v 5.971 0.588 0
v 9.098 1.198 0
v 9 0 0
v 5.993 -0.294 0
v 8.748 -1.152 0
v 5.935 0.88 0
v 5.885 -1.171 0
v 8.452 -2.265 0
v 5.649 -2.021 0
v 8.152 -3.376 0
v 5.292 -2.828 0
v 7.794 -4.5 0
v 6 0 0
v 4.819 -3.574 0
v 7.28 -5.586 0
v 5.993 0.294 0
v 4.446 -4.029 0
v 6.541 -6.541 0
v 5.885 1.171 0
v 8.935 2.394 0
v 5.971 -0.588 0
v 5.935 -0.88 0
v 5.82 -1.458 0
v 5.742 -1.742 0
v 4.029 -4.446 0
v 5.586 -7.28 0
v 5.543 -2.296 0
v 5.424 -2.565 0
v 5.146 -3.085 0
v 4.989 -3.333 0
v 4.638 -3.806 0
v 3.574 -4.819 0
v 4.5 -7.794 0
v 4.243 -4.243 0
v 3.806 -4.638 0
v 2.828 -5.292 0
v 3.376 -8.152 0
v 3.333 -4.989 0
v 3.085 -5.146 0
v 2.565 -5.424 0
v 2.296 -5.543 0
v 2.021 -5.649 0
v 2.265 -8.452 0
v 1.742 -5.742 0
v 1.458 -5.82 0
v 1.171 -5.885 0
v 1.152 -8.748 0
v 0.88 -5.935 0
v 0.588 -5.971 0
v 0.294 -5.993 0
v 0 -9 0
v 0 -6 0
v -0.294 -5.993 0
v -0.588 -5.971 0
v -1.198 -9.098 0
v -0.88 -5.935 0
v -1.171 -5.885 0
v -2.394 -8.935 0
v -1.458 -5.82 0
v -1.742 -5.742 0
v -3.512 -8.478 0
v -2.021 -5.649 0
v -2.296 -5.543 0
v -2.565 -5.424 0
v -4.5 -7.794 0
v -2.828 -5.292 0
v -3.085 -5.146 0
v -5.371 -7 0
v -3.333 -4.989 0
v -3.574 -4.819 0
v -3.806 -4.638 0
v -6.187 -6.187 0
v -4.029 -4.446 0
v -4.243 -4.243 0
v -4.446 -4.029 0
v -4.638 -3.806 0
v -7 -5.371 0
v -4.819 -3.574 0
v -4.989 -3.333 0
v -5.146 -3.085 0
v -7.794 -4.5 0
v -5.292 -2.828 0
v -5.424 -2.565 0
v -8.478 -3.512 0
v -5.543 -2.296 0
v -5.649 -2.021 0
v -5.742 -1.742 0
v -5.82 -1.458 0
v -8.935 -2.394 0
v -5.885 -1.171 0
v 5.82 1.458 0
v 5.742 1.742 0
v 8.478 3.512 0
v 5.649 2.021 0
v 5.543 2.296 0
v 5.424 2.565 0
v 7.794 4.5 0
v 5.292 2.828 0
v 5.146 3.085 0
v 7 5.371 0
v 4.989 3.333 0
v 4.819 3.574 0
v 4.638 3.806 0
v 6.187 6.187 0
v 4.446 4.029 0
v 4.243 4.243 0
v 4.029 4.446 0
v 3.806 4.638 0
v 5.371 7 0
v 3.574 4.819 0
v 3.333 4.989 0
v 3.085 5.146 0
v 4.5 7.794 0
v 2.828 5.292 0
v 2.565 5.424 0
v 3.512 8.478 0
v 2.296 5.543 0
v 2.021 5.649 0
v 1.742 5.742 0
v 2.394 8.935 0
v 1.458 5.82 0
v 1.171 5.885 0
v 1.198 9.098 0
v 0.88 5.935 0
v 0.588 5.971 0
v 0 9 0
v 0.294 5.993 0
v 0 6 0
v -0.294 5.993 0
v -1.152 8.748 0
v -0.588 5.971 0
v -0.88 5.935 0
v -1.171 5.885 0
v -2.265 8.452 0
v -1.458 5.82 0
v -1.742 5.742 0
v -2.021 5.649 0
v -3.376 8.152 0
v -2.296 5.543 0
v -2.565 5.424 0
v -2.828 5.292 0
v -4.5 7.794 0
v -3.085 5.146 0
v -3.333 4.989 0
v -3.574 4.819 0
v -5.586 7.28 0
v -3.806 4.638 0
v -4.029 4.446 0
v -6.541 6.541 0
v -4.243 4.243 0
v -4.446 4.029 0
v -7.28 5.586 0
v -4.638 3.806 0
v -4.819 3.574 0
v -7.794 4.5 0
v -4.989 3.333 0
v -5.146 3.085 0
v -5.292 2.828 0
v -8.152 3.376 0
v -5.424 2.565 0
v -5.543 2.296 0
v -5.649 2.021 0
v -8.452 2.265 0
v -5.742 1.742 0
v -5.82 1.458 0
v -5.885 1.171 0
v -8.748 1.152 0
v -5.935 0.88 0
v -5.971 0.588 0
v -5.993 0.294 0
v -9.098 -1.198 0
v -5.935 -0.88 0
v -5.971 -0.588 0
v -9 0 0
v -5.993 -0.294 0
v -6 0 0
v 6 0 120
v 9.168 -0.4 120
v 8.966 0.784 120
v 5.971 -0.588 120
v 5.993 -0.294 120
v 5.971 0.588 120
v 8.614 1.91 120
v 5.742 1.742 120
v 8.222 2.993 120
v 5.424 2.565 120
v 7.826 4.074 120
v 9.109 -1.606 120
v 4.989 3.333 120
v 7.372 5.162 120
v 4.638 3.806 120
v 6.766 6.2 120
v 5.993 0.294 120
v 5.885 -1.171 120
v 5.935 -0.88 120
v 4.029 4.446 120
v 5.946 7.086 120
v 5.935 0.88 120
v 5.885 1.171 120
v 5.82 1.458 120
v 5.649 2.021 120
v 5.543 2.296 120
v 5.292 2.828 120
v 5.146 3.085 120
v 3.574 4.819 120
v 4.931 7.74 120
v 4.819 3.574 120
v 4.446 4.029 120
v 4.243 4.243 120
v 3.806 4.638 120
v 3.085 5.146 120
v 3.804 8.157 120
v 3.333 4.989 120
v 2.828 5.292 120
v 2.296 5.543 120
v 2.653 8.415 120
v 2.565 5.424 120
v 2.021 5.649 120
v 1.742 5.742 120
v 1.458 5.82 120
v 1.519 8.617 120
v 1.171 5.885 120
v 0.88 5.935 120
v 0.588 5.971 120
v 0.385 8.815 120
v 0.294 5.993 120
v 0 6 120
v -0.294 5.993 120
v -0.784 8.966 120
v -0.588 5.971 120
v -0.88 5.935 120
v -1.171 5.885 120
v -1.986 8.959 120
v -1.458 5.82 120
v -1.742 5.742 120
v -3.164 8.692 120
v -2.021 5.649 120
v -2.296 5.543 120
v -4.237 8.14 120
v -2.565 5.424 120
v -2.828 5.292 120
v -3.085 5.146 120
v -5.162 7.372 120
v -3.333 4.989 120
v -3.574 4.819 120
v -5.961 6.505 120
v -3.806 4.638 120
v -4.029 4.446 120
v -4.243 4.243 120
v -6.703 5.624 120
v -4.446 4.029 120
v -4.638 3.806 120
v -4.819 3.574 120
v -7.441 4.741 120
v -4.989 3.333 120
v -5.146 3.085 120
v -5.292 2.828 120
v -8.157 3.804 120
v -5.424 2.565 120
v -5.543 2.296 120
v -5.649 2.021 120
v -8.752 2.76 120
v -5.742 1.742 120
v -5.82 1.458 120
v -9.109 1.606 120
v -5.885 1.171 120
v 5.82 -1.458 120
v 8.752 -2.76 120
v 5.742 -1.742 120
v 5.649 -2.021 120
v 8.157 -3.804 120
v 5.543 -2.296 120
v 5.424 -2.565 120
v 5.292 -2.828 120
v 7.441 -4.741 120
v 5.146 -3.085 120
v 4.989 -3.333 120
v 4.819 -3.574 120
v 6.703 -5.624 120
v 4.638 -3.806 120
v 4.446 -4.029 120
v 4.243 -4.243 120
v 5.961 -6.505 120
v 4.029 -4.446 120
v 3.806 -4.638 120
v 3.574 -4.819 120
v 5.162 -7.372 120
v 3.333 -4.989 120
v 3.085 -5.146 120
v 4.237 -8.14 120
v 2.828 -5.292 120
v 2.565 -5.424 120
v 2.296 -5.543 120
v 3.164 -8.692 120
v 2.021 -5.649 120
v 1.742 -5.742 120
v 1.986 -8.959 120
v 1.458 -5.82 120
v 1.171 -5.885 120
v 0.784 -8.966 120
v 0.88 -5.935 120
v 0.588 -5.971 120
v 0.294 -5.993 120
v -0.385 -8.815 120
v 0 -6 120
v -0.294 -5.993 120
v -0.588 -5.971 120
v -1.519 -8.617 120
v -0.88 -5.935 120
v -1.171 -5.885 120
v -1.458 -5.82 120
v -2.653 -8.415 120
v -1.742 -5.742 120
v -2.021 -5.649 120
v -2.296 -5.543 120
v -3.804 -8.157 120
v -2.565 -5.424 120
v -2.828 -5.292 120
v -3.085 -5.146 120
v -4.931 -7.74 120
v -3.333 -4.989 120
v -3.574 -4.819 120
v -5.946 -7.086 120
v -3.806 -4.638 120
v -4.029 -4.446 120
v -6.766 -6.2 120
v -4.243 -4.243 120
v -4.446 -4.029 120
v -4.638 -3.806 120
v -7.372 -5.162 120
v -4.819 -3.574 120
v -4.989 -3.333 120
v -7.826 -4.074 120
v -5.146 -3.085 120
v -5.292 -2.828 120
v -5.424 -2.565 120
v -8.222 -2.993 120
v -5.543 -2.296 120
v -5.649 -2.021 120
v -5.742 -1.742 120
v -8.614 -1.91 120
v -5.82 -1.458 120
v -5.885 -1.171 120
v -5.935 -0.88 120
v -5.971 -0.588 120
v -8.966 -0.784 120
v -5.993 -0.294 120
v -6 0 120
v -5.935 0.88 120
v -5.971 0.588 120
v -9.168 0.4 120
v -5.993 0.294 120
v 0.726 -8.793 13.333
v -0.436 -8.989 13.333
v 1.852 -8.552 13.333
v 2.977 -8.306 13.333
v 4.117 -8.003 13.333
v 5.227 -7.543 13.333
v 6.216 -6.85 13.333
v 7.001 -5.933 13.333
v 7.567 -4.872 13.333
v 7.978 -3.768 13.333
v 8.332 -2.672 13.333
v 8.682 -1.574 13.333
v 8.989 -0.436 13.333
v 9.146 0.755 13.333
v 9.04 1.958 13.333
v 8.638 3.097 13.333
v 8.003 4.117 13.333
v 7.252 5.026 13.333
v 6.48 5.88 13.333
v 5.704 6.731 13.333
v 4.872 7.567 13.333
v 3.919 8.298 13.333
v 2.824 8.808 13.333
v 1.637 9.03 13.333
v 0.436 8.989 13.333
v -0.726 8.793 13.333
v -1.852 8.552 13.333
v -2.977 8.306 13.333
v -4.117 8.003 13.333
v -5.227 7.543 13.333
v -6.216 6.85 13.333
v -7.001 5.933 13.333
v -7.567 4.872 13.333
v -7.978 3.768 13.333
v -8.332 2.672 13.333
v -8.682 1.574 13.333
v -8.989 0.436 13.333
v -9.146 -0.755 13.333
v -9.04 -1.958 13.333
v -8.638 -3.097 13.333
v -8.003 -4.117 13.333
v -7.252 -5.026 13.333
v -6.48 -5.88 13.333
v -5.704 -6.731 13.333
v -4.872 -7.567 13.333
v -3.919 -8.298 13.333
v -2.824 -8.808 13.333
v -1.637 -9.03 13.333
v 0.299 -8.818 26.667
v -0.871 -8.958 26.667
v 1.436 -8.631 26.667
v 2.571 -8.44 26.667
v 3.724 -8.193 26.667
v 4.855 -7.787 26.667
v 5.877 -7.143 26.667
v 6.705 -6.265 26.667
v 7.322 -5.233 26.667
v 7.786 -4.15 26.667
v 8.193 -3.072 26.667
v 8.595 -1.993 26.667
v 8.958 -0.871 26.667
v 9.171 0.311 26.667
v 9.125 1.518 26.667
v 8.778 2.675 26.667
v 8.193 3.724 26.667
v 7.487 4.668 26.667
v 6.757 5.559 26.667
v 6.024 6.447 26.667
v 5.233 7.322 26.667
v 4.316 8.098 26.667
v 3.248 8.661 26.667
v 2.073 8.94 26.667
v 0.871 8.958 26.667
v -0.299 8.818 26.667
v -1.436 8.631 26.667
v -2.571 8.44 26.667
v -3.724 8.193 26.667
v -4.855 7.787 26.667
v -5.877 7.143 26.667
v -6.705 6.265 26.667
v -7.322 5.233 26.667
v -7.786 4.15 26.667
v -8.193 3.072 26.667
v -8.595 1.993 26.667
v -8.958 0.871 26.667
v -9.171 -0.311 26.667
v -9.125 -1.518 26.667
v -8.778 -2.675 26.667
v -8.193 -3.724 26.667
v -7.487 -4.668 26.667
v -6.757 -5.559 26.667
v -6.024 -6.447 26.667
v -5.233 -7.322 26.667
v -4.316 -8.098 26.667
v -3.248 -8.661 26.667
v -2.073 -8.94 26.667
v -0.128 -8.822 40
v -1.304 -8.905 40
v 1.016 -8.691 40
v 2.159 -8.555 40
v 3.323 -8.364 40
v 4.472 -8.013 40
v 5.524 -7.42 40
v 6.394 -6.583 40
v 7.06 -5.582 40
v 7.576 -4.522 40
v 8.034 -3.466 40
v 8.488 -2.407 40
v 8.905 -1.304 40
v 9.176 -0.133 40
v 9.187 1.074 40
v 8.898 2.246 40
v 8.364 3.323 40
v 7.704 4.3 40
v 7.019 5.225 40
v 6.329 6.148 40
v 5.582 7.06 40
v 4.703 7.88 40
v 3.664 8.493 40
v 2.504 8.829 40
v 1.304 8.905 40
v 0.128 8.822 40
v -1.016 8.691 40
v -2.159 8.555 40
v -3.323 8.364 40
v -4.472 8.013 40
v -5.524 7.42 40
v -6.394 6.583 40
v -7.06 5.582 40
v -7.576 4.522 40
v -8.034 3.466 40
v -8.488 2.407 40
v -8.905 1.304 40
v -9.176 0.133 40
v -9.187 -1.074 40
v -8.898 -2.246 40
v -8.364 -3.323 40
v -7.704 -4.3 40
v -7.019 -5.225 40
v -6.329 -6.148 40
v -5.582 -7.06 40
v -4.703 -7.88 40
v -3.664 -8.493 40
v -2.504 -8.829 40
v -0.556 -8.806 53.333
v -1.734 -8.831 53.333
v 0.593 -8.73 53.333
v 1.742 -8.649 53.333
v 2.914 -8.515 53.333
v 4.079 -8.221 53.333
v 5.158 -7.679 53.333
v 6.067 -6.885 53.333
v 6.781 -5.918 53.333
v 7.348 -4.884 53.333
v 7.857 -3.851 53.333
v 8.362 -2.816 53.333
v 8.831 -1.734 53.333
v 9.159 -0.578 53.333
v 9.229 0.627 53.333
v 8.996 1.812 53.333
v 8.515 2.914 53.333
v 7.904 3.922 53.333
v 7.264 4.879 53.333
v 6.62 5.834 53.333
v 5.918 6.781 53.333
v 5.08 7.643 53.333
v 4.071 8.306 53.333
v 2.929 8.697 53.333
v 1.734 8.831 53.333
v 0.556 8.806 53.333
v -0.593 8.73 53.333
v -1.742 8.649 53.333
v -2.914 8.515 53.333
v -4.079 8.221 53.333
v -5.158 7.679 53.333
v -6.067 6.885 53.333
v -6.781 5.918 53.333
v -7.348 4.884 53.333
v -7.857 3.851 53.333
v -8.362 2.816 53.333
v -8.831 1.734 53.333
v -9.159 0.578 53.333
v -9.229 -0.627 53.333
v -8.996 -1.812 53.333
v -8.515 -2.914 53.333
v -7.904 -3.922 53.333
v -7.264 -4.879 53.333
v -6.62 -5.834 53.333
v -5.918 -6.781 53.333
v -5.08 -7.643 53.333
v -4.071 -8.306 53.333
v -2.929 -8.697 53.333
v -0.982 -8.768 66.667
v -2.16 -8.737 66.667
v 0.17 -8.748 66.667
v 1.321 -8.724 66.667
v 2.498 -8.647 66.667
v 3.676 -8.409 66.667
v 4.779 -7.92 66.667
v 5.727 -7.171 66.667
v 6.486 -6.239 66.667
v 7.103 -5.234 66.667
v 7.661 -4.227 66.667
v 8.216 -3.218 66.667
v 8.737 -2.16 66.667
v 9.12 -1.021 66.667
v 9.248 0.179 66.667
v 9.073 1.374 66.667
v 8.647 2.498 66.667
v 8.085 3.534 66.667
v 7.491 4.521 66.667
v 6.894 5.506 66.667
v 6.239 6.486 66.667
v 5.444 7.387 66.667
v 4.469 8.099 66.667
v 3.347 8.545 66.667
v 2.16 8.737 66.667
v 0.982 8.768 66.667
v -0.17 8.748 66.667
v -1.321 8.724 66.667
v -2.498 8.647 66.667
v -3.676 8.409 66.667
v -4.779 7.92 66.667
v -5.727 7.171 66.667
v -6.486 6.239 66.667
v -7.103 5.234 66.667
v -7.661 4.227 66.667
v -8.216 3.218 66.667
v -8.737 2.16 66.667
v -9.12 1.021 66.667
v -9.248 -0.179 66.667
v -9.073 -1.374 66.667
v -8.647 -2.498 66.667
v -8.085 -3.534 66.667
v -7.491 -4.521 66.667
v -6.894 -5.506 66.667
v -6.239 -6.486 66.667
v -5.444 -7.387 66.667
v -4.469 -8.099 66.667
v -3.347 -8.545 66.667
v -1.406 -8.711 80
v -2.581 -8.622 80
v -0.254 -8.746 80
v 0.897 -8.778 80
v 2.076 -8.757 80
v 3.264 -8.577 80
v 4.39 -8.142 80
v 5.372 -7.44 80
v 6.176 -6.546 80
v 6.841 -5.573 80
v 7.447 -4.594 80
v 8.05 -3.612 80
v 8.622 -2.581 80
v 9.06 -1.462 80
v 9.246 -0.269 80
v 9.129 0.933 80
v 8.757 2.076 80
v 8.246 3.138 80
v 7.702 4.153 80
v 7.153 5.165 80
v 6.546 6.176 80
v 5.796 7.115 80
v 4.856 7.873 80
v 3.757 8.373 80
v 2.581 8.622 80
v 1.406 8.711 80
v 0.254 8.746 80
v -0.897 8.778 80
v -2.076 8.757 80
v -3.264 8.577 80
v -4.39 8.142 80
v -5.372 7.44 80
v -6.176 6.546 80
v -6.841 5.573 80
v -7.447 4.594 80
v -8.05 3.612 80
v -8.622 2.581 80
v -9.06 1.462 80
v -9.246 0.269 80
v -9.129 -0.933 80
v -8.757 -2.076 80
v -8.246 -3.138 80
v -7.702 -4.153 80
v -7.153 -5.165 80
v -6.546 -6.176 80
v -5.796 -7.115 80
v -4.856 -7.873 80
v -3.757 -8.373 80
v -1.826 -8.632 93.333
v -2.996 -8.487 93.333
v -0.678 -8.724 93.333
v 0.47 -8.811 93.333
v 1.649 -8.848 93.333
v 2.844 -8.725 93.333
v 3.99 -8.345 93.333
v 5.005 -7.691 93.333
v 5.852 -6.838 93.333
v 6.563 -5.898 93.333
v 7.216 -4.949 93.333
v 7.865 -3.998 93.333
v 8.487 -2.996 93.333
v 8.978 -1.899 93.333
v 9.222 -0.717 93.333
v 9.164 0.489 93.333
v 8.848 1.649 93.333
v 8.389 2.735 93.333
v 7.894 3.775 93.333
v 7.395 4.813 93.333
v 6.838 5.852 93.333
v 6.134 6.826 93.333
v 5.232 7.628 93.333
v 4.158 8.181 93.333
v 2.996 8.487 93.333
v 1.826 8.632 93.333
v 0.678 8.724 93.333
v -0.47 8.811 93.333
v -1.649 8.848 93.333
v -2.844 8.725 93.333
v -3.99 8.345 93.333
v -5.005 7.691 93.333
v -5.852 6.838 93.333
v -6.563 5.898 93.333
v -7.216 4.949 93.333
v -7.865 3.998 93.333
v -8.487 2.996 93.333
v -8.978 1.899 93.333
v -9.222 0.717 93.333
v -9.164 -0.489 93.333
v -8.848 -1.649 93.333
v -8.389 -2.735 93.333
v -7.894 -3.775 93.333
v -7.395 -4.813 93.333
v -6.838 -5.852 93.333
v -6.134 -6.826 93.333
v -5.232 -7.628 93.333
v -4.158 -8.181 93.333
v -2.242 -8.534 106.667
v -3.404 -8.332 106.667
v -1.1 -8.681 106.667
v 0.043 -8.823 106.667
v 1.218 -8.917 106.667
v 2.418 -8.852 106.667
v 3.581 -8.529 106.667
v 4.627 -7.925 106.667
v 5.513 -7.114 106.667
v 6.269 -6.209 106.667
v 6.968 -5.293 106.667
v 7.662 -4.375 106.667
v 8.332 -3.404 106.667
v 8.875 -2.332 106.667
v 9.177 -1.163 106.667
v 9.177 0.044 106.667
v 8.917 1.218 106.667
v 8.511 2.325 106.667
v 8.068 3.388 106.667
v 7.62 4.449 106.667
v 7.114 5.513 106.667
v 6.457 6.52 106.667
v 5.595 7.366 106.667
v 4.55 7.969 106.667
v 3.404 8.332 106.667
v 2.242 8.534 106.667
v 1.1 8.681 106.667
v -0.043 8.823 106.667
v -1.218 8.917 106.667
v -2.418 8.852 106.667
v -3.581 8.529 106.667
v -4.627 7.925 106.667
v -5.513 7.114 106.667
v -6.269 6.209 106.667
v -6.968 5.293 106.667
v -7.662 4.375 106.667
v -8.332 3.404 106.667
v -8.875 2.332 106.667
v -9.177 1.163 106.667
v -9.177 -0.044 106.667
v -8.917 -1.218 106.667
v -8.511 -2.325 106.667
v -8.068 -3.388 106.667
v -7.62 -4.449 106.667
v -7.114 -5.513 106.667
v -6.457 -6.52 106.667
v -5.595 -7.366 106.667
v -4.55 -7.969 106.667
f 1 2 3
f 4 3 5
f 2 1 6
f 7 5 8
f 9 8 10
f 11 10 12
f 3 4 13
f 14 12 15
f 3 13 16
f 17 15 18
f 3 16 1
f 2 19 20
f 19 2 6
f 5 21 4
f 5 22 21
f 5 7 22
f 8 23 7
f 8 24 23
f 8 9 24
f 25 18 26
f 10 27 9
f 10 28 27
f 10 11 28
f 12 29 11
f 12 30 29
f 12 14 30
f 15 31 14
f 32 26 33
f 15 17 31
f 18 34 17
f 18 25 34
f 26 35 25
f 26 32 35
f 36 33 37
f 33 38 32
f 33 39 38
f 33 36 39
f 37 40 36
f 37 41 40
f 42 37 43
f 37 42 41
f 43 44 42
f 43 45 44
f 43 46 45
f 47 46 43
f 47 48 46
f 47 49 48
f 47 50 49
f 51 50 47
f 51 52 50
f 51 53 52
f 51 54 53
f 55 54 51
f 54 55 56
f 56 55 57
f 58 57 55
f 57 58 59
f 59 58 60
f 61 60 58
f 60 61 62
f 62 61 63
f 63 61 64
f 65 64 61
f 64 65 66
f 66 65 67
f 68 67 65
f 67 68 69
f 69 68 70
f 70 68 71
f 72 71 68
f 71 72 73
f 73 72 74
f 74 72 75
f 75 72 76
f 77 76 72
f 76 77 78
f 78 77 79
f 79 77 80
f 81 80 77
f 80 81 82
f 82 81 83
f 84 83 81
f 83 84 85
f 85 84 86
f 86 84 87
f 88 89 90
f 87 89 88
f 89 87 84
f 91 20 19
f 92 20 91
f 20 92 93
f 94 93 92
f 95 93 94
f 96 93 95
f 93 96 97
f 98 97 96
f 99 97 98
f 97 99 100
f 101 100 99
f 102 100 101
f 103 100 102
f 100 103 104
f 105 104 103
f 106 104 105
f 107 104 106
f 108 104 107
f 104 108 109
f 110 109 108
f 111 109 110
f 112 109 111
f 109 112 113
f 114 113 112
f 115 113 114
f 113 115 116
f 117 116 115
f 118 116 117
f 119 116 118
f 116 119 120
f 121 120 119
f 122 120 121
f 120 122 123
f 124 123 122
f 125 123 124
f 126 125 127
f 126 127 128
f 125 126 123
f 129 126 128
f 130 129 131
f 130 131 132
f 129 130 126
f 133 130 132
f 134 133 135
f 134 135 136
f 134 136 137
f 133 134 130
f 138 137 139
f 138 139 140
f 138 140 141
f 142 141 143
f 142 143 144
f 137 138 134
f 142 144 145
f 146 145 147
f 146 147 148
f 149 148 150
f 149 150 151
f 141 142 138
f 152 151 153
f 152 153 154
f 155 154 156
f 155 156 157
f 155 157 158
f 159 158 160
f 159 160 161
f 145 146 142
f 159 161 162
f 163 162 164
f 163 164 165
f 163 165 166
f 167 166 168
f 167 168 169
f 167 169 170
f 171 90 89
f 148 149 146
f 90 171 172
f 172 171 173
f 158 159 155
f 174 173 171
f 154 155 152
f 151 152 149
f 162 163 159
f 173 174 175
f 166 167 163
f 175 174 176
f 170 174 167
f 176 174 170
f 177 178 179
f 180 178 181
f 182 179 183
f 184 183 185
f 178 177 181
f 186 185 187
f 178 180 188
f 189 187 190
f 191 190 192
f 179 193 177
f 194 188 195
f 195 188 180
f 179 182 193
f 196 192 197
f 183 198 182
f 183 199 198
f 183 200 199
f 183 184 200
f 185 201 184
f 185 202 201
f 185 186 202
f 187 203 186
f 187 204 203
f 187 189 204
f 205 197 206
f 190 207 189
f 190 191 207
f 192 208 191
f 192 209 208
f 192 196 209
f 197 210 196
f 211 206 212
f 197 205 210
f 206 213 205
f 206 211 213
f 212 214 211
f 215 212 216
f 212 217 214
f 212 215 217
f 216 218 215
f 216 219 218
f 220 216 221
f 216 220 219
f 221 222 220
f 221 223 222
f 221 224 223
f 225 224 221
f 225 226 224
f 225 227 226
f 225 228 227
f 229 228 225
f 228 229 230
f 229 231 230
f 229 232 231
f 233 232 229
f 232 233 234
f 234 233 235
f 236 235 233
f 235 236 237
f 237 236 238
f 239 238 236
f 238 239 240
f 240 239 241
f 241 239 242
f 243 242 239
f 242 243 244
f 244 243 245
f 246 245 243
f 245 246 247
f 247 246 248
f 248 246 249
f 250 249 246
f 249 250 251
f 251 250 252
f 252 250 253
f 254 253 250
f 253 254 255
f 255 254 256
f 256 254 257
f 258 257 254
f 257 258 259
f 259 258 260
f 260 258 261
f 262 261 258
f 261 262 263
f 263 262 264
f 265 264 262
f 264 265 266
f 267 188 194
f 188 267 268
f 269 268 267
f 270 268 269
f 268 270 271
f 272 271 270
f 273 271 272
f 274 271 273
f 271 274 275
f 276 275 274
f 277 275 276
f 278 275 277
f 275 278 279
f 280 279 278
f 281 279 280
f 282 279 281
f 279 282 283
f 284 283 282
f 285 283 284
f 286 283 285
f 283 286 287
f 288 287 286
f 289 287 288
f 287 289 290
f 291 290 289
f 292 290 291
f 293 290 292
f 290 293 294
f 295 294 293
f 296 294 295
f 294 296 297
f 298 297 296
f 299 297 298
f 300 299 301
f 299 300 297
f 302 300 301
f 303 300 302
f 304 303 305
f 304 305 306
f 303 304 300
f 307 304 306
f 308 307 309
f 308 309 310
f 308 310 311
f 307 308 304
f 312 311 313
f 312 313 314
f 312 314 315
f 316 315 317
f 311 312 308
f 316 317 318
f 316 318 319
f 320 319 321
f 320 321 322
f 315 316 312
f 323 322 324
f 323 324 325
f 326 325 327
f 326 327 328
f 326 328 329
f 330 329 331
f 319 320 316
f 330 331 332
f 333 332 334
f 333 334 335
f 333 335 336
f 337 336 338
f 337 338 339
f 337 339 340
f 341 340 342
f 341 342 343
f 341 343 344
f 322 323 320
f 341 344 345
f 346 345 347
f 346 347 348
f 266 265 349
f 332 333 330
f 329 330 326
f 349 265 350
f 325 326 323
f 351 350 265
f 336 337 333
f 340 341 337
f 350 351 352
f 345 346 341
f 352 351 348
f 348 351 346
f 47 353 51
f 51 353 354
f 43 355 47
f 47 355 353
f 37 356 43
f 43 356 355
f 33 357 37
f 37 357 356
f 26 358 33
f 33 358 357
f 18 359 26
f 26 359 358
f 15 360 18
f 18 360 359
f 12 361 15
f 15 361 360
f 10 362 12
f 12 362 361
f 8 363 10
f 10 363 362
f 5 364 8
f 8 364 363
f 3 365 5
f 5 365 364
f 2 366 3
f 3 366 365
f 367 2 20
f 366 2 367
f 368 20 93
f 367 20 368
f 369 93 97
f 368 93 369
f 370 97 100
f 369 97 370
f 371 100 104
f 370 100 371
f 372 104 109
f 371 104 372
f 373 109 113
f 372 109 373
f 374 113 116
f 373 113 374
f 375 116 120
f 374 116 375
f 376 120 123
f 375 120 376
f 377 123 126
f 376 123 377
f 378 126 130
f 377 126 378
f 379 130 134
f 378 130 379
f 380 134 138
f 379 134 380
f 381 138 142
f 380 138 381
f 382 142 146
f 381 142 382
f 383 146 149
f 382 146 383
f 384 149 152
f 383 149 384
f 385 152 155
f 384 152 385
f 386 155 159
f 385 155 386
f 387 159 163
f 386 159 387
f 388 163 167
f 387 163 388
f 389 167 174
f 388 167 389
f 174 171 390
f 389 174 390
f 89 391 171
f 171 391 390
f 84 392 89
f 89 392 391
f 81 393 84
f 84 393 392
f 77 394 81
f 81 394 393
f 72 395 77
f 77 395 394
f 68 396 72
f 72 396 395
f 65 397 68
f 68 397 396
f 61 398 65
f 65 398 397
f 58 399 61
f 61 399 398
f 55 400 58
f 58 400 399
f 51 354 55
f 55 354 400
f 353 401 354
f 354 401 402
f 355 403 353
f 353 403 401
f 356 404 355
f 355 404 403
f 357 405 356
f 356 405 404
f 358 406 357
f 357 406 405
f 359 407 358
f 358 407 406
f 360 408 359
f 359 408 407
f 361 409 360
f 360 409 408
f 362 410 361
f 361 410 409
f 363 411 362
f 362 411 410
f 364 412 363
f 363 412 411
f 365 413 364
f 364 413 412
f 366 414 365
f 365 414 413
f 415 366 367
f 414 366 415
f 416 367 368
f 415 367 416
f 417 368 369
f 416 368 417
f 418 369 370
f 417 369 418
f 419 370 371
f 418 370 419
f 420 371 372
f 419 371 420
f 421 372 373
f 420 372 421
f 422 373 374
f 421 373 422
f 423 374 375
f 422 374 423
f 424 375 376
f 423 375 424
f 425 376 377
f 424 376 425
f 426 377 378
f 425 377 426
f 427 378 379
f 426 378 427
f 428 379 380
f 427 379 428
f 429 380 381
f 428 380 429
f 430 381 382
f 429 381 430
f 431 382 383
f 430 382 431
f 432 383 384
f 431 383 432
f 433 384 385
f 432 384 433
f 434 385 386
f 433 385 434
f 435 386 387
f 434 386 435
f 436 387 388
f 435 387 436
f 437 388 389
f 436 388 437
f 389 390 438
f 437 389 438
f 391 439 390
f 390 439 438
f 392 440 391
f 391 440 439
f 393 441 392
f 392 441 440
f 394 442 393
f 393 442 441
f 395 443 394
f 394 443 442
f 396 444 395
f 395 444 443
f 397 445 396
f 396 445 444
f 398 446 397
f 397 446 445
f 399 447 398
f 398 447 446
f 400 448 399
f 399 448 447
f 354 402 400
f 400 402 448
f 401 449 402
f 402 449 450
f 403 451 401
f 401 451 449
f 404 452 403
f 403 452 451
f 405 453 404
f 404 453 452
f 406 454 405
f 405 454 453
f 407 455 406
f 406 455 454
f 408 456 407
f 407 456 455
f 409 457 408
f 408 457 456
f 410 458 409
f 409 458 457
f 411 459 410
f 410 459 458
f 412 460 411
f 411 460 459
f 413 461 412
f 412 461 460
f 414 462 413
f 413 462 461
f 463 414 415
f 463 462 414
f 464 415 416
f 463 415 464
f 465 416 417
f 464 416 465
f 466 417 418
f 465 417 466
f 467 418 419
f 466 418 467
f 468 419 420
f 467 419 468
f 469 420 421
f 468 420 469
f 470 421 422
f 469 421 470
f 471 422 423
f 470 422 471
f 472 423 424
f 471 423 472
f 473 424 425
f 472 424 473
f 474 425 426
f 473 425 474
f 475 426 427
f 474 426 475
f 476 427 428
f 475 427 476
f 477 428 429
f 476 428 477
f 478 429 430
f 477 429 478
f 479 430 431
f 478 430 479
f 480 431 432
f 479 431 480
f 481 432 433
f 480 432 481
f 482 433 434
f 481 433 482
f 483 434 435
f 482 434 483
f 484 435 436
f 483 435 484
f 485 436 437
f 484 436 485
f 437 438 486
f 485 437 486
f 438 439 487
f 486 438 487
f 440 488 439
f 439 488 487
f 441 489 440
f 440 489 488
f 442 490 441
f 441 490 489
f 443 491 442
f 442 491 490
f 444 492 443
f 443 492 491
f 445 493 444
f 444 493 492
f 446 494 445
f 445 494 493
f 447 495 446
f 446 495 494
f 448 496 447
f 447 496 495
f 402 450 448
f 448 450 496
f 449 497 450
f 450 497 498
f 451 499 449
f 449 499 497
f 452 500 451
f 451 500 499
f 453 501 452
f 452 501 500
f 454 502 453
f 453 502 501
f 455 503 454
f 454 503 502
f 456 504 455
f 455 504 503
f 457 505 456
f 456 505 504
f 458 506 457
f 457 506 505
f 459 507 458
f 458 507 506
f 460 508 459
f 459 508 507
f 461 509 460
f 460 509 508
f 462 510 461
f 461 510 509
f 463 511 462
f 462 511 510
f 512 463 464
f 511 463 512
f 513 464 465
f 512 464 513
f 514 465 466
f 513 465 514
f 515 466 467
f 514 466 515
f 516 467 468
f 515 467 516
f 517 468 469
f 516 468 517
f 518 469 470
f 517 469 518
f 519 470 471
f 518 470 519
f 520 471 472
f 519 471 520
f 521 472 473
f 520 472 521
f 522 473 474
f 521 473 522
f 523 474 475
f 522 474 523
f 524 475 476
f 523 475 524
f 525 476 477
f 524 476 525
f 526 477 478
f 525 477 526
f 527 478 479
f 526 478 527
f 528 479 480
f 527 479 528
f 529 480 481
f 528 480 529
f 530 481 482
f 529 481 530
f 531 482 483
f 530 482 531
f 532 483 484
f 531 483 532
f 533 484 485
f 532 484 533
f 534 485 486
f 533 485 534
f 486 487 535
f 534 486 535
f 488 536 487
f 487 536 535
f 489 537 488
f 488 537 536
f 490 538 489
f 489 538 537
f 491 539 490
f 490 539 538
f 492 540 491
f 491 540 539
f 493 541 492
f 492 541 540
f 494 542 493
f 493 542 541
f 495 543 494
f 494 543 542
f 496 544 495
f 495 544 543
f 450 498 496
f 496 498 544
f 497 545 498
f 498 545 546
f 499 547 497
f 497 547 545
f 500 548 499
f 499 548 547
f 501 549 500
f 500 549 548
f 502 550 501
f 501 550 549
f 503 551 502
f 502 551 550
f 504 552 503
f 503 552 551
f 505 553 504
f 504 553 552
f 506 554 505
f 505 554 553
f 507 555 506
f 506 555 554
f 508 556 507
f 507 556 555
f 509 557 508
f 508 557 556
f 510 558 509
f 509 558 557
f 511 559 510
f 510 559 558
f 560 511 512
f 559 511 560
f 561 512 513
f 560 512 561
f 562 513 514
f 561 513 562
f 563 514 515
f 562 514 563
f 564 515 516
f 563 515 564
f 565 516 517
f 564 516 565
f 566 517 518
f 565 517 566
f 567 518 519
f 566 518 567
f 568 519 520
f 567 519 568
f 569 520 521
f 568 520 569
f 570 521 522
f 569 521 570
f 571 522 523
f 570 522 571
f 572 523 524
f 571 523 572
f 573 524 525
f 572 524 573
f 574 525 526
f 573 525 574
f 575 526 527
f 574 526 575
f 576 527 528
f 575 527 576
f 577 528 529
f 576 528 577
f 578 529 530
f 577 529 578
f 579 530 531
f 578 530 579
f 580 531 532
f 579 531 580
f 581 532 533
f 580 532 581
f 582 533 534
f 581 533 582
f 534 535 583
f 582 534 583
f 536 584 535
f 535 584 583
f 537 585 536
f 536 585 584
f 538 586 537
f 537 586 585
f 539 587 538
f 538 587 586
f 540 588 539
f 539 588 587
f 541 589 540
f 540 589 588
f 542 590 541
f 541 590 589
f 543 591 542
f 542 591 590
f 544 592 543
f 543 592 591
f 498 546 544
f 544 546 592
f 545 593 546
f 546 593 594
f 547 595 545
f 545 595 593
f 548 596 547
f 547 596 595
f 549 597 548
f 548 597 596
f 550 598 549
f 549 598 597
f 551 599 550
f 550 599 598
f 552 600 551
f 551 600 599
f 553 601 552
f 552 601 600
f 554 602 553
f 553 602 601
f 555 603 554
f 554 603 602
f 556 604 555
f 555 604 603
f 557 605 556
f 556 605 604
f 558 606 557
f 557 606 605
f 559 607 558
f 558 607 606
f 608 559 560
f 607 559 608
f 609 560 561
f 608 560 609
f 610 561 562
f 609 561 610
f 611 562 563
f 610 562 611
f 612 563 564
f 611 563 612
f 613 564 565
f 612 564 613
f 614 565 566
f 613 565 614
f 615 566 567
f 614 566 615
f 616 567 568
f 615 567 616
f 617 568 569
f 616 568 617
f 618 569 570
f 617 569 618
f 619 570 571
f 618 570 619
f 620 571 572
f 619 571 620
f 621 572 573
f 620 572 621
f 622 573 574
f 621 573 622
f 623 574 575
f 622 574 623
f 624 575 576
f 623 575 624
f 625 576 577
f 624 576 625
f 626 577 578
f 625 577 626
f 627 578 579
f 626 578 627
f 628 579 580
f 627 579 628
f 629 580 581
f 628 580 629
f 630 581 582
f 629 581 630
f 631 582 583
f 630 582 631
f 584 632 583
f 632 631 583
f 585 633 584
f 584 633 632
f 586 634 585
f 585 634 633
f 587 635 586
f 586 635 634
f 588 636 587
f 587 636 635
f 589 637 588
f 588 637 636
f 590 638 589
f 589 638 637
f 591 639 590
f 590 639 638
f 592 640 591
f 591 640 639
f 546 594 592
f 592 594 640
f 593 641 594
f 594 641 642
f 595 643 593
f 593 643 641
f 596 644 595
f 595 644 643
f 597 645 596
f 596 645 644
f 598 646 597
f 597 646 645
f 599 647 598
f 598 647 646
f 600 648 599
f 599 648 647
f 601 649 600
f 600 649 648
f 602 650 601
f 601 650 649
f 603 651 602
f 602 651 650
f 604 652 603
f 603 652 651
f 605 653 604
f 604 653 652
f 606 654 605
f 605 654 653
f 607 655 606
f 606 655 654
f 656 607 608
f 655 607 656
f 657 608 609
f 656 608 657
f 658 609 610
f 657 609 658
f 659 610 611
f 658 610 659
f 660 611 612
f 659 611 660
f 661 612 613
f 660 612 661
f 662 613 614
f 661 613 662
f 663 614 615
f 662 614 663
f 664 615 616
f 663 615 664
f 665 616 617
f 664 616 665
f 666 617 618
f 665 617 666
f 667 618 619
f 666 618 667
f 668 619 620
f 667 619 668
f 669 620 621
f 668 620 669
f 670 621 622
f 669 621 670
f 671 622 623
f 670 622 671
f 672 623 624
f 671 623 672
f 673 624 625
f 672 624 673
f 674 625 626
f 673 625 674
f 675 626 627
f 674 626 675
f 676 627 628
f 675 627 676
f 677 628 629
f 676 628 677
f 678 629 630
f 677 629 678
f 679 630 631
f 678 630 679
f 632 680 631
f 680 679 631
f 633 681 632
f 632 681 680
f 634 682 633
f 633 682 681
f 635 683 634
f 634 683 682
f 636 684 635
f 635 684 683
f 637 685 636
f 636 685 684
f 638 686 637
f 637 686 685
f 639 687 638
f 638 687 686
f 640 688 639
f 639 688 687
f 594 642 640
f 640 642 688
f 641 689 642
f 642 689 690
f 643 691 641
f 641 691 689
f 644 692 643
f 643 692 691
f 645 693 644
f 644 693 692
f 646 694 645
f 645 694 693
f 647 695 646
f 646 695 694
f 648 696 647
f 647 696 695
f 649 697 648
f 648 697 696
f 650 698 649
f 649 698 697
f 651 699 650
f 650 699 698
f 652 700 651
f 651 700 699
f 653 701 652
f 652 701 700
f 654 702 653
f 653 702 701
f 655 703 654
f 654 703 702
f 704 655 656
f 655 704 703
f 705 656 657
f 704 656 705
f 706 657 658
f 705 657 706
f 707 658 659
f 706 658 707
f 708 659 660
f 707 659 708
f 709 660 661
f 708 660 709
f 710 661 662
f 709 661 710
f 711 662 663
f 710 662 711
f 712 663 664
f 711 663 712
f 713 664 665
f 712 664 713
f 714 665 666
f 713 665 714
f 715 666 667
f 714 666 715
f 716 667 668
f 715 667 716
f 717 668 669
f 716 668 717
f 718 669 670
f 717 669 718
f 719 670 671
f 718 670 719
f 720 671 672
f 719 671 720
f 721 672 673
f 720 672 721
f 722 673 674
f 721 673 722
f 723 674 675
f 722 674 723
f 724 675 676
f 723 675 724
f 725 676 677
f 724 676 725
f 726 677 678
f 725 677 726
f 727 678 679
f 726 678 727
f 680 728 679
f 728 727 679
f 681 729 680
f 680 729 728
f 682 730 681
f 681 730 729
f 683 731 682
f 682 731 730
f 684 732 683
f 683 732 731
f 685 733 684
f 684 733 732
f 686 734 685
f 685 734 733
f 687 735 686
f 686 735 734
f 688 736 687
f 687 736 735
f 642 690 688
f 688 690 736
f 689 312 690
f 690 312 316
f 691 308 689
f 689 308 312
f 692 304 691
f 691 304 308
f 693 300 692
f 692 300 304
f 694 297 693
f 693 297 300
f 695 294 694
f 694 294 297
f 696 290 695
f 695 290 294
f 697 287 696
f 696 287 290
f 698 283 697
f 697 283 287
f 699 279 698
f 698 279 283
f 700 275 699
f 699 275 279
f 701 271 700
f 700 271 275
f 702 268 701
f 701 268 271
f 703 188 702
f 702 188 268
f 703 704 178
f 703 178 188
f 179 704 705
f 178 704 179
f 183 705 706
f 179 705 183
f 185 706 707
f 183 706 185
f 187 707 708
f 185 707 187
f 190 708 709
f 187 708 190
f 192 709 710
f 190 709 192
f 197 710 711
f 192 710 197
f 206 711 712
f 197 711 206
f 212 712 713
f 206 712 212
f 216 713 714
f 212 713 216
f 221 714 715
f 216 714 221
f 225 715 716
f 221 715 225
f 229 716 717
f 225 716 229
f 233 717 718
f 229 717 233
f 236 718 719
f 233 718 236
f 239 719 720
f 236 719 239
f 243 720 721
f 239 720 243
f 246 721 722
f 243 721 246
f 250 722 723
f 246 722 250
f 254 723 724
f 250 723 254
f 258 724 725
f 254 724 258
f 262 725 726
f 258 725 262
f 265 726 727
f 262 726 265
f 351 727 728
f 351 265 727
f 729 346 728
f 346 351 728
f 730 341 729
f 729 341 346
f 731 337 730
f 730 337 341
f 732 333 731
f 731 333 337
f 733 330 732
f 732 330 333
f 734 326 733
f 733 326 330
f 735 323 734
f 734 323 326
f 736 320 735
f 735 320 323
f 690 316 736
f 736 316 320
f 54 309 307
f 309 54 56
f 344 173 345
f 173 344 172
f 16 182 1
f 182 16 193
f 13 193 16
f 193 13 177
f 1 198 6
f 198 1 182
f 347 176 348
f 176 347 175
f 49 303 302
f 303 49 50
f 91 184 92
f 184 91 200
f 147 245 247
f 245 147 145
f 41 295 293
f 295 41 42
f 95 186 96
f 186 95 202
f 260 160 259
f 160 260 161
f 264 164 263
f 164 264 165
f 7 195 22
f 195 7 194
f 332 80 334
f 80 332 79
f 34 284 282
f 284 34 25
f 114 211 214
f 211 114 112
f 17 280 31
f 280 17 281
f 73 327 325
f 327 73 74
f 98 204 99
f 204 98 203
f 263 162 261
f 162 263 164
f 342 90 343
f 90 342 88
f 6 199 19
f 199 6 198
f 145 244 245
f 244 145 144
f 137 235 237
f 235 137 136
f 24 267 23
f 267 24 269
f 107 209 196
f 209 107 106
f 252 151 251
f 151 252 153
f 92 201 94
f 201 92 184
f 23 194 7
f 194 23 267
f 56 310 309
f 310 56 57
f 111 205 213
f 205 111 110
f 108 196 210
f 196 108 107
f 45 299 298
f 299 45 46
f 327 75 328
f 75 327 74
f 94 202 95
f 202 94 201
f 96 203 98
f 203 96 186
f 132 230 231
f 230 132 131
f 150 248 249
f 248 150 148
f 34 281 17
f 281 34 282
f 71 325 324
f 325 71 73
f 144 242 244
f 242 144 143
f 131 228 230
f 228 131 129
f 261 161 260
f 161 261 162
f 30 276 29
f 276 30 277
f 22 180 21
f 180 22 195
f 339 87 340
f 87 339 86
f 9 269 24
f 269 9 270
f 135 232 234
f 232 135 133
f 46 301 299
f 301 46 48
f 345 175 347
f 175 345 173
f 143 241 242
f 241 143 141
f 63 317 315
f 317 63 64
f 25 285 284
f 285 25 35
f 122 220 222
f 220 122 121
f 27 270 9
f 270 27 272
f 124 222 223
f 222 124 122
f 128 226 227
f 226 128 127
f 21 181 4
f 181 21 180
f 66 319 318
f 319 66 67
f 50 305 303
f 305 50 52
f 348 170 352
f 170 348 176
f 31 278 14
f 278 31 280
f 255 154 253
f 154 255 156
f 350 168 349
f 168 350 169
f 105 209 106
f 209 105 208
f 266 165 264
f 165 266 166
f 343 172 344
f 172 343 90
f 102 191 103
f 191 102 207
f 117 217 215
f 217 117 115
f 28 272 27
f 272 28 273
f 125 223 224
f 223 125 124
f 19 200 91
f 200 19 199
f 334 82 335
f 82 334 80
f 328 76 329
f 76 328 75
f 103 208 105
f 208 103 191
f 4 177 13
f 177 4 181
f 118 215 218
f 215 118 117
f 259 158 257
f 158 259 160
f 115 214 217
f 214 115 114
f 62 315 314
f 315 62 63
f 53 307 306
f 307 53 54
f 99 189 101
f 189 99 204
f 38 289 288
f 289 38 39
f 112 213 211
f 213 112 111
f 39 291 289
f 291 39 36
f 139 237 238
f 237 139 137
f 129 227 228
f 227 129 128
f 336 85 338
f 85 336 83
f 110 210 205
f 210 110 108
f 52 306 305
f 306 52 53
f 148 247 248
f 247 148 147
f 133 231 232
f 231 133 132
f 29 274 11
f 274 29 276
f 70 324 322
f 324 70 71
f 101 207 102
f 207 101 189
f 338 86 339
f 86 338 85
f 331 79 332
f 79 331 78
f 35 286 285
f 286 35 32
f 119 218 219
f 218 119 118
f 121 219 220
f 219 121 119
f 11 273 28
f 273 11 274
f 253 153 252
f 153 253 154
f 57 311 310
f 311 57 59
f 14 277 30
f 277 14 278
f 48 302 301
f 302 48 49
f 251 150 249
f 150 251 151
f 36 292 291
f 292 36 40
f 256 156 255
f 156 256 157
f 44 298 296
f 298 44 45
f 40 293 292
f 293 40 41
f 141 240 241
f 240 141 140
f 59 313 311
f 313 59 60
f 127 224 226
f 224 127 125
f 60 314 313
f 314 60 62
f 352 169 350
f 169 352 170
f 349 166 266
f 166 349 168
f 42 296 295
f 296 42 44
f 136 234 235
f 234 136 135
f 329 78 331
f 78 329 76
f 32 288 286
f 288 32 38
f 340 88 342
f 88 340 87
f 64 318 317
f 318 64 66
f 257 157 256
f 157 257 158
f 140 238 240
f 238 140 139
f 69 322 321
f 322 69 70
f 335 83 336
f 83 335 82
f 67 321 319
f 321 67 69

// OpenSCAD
$fn = 128;

// Neoprene tubing (generic): hollow cylinder with slight surface texture
// Units: mm

// Parameters
tube_length = 120;
outer_diameter = 18;
wall_thickness = 3.0;

// Texture controls (subtle)
texture_amplitude = 0.25;   // mm radial variation
texture_pitch = 6;          // mm per cycle along length
texture_twist = 25;         // degrees twist over full length

// Derived
outer_r = outer_diameter/2;
inner_r = outer_r - wall_thickness;
assert(inner_r > 0, "Wall thickness too large for given outer diameter.");

module neoprene_tube(len=tube_length, ro=outer_r, ri=inner_r) {
    difference() {
        // Outer body with subtle helical ribbing to suggest neoprene texture
        linear_extrude(height=len, twist=texture_twist, convexity=10)
            textured_ring(ro, ri=0, amp=texture_amplitude, pitch=texture_pitch);

        // Inner bore (smooth)
        translate([0,0,-0.5])
            cylinder(h=len+1, r=ri, center=false);
    }
}

// 2D textured outer profile (a slightly wavy circle), then extruded
module textured_ring(ro, ri=0, amp=0.2, pitch=6) {
    // Create a wavy outer boundary using a polygon approximation
    // Number of lobes around circumference chosen to be subtle and not too busy
    lobes = 48;
    pts = [
        for (i = [0:lobes-1]) 
            let(a = 360*i/lobes)
            let(w = amp * sin(6*a))  // 6 waves around circumference
            [(ro + w)*cos(a), (ro + w)*sin(a)]
    ];

    difference() {
        polygon(points=pts);
        if (ri > 0) circle(r=ri);
    }
}

// Render
neoprene_tube();
